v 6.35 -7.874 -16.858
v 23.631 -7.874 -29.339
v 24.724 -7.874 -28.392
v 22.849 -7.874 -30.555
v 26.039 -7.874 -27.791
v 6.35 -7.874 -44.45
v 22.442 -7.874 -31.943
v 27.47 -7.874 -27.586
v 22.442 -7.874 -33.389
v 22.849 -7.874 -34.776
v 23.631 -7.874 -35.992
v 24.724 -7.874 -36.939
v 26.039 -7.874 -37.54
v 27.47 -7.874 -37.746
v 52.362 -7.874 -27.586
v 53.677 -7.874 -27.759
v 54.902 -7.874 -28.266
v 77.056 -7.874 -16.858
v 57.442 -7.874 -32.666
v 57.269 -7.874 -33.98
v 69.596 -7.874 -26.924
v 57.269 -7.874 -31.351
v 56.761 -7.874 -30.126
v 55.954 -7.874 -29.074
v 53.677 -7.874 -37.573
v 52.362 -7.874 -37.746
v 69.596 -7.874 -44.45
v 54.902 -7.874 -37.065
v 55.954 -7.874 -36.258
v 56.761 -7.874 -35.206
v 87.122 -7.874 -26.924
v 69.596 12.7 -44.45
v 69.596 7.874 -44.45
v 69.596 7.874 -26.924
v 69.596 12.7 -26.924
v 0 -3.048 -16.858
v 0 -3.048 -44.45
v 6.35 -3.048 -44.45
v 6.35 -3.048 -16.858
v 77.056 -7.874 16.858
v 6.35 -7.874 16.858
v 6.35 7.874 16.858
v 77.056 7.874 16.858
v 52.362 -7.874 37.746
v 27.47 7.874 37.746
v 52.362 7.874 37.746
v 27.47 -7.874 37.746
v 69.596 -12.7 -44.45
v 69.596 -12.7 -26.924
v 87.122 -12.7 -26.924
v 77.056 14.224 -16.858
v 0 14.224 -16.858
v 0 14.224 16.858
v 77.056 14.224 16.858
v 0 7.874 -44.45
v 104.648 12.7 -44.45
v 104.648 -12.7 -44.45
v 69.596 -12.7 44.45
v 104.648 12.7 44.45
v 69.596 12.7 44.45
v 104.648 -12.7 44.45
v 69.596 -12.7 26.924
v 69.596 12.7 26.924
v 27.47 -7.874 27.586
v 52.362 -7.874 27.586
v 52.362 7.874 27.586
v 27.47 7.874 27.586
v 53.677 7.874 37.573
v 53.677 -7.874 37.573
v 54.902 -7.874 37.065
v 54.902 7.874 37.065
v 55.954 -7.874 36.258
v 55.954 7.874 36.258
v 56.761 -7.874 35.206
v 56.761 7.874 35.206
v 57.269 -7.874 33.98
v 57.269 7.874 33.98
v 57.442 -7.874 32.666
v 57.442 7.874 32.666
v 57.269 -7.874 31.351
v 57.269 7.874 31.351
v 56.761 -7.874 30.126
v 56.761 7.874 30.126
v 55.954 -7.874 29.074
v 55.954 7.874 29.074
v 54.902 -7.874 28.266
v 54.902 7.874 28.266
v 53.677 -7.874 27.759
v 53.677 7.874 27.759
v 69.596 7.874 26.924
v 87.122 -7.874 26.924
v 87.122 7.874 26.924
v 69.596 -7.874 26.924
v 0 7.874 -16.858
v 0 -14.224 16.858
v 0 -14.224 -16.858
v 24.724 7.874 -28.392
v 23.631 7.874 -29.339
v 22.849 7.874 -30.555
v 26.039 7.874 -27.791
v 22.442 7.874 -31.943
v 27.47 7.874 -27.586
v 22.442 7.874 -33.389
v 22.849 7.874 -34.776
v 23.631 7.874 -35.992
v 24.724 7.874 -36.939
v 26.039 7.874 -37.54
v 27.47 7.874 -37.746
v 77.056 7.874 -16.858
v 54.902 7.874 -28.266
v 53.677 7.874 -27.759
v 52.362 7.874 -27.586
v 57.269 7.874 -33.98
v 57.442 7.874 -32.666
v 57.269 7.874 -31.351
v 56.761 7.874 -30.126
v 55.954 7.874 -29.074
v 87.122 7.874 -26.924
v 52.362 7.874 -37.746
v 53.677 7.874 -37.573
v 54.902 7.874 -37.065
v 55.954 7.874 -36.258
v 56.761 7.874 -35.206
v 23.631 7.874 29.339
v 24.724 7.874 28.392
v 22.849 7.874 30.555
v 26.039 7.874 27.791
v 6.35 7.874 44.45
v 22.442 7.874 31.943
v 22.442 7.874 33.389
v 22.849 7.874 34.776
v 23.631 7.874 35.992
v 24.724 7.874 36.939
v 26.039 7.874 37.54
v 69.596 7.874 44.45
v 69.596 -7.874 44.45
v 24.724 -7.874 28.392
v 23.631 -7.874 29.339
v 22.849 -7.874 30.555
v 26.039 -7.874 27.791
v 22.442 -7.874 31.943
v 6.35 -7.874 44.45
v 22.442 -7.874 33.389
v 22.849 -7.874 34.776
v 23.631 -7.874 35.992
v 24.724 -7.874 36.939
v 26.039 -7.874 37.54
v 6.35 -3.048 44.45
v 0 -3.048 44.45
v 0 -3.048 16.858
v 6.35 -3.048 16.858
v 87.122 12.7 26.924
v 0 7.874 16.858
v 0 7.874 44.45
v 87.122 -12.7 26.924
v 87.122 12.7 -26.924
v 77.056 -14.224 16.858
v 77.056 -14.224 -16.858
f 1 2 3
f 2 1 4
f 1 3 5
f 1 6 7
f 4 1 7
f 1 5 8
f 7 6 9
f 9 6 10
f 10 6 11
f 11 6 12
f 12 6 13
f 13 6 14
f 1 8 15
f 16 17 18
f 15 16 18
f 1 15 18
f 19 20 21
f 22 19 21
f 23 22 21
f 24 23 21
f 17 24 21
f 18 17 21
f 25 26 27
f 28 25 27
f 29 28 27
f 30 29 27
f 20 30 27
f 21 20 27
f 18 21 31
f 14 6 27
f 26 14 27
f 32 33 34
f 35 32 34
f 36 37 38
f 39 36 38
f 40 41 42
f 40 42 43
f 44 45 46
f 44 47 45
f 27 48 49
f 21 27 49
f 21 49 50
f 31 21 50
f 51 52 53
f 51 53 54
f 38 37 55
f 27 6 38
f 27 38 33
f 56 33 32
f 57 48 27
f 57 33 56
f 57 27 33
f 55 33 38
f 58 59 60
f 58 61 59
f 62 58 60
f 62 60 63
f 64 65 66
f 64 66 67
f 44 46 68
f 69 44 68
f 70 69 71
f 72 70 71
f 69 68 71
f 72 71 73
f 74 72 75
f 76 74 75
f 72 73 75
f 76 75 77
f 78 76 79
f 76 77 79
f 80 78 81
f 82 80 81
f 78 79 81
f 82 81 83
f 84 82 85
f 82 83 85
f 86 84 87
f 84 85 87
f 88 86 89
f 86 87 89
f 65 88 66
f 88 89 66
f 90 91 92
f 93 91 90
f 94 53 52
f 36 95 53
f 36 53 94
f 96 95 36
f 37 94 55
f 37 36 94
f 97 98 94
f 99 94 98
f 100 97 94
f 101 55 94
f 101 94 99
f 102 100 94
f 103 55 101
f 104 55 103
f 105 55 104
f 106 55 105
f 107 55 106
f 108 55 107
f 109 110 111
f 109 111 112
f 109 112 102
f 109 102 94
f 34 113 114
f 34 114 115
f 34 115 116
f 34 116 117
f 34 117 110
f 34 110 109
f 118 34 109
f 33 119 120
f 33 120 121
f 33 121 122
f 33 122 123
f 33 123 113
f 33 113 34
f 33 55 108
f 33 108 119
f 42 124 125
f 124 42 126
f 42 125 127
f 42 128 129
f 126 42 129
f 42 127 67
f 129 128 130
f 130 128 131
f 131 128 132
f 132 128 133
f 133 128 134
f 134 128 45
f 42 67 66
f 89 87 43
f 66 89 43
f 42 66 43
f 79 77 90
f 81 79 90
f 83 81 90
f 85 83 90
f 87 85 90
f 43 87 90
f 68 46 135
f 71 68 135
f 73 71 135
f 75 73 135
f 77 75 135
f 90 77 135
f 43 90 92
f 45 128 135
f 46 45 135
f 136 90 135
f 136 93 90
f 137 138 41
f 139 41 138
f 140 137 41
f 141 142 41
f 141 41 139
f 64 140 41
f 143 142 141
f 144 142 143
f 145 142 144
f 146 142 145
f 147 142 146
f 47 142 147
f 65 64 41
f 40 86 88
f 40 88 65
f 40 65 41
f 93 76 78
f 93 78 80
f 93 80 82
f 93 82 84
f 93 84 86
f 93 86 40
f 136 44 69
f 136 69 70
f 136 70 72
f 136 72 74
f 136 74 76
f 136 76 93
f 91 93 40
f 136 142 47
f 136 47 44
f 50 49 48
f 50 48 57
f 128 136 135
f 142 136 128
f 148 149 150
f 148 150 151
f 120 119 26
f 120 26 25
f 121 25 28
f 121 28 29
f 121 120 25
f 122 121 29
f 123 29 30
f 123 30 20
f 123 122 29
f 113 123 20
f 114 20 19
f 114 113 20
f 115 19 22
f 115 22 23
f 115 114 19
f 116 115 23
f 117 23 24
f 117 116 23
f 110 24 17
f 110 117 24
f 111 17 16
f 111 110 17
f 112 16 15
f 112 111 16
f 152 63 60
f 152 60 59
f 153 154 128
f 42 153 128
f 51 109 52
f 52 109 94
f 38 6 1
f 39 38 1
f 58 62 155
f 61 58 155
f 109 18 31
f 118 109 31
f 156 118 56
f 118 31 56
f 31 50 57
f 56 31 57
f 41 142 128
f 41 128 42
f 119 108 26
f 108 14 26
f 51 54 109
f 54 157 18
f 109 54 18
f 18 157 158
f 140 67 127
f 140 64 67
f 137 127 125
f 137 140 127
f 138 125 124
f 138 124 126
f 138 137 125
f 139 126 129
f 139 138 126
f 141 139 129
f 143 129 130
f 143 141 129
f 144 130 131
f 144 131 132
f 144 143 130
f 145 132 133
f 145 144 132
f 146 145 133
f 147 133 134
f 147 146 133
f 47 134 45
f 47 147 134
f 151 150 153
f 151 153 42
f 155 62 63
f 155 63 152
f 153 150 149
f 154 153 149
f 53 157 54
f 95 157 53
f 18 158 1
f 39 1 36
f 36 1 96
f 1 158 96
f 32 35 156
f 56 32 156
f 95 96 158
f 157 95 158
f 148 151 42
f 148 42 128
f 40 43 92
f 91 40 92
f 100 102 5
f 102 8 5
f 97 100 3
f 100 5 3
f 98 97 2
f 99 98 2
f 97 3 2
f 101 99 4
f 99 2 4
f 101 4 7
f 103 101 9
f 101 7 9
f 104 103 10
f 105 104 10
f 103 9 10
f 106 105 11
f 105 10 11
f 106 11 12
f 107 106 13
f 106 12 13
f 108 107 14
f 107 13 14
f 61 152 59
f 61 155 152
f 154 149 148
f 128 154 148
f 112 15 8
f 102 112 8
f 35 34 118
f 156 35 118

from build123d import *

# Parameters (mm, degrees)
F1_DEPTH = 14.224
F2_DEPTH = 12.7
F3_DEPTH = 7.874
F0_W     = 6.35
F0_H     = 27.592076916
F4_DEPTH = 7.874
F5_DEPTH = 4.826


with BuildPart() as f1:
    # F0 (on Front) → F1 (new body, symmetric)
    with BuildSketch(Plane.XZ):
        Polygon((6.35, 16.857923084), (0, 16.857923084), (0, 0), (77.055923084, 0), (77.055923084, 16.857923084), align=None)
    extrude(amount=F1_DEPTH, both=True)

    # F6: F1, F2, F3, F4 across face


with BuildPart() as f2:
    # F0 (on Front) → F2 (new body, symmetric)
    with BuildSketch(Plane.XZ):
        Polygon((104.648, 44.45), (69.596, 44.45), (69.596, 26.924), (87.122, 26.924), align=None)
    extrude(amount=F2_DEPTH, both=True)


with BuildPart() as f3:
    # F0 (on Front) → F3 (new body, symmetric)
    with BuildSketch(Plane.XZ):
        Polygon((69.596, 44.45), (6.35, 44.45), (6.35, 16.857923084), (77.055923084, 16.857923084), (87.122, 26.924), (69.596, 26.924), align=None)
        with BuildLine():
            ThreePointArc((52.3620410664, 37.7456286583), (55.9541435148, 36.2577311068), (57.4420410664, 32.6656286583))
            ThreePointArc((57.4420410664, 32.6656286583), (55.9541435148, 29.0735262099), (52.3620410664, 27.5856286583))
            Line((52.3620410664, 27.5856286583), (27.4700410664, 27.5856286583))
            ThreePointArc((27.4700410664, 27.5856286583), (22.3900410664, 32.6656286583), (27.4700410664, 37.7456286583))
            Line((27.4700410664, 37.7456286583), (52.3620410664, 37.7456286583))
        make_face(mode=Mode.SUBTRACT)
    extrude(amount=F3_DEPTH, both=True)


with BuildPart() as f4:
    # F0 (on Front) → F4 (new body, symmetric)
    with BuildSketch(Plane.XZ):
        with Locations((3.175, 30.653961542)):
            Rectangle(F0_W, F0_H)
    extrude(amount=F4_DEPTH, both=True)

    # F5 (cut): a face of the model
    f5_faces = [f4.faces().sort_by_distance(p)[0] for p in [
        (3.175, -7.874, 30.653961542),
    ]]
    extrude(f5_faces, amount=-F5_DEPTH, mode=Mode.SUBTRACT)


with BuildPart() as f1_1:
    add(f1.part)
    add(f1.part.mirror(Plane(origin=(38.527961542, 0, 0), x_dir=(1, 0, 0), z_dir=(0, 0, -1))))
    add(f2.part.mirror(Plane(origin=(38.527961542, 0, 0), x_dir=(1, 0, 0), z_dir=(0, 0, -1))))
    add(f3.part.mirror(Plane(origin=(38.527961542, 0, 0), x_dir=(1, 0, 0), z_dir=(0, 0, -1))))
    add(f4.part.mirror(Plane(origin=(38.527961542, 0, 0), x_dir=(1, 0, 0), z_dir=(0, 0, -1))))


solid = Compound([f2.part, f3.part, f4.part, f1_1.part])
